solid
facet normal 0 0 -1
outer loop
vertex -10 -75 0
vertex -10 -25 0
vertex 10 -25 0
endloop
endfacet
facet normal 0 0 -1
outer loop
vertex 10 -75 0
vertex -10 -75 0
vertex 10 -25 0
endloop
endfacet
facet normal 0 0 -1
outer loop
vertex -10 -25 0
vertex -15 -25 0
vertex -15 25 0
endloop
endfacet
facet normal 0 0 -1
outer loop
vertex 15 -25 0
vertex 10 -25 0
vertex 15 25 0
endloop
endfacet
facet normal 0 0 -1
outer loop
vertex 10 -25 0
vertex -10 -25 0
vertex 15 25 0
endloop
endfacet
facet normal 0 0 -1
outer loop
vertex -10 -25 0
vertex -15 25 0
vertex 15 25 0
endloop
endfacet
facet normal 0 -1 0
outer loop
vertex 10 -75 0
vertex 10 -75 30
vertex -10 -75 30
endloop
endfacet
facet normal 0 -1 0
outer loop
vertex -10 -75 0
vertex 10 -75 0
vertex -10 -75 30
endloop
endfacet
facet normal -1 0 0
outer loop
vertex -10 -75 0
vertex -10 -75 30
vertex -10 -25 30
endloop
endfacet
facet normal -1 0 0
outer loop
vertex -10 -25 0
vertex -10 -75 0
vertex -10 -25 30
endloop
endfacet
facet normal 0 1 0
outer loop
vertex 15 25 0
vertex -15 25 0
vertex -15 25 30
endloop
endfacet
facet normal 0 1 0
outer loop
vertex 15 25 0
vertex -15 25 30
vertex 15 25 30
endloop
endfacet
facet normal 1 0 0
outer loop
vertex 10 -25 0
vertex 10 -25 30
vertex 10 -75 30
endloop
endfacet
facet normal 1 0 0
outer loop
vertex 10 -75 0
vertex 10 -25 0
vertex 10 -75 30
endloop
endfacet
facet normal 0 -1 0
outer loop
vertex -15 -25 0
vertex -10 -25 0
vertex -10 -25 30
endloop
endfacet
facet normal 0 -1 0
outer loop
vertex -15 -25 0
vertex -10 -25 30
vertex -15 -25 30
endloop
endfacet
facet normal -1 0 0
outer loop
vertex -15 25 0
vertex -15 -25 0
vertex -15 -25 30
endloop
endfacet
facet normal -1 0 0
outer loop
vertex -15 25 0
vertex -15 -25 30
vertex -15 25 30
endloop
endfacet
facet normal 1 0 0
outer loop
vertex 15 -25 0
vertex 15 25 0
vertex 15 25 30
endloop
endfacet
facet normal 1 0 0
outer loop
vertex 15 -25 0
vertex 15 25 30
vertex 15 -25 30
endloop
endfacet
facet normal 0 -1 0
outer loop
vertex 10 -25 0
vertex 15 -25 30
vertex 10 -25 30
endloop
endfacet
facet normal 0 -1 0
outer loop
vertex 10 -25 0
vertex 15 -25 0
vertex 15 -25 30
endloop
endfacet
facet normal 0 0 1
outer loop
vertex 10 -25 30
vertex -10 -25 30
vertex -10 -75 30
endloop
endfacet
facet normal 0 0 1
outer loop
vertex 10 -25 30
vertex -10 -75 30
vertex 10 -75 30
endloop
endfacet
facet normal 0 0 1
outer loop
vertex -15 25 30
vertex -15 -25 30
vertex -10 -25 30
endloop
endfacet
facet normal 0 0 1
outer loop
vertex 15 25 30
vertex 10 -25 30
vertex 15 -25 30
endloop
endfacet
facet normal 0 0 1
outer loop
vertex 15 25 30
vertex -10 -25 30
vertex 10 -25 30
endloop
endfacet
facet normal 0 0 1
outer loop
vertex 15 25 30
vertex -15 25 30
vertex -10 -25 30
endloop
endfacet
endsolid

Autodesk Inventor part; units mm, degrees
sketch "Sketch1" plane through (0, 0, 0) normal (0, 0, 1) x (1, 0, 0)
  line L0 (-15, 25) -> (15, 25)
  line L1 (15, 25) -> (15, -25)
  line L2 (15, -25) -> (-15, -25)
  line L3 (-15, -25) -> (-15, 25)
  point P0 (0, 0)
  point P1 (0, 25)
  point P2 (-15, 0)
  dimension "d0" = 50
  dimension "d1" = 30
extrude "Extrusion1" add sketch "Sketch1" along normal blind 30
sketch "Sketch2" plane through (0, 0, 30) normal (0, 0, 1) x (1, 0, 0)
  line L0 (-15, -25) -> (15, -25) projected
  line L1 (-10, -25) -> (10, -25)
  line L2 (10, -25) -> (10, -75)
  line L3 (10, -75) -> (-10, -75)
  line L4 (-10, -75) -> (-10, -25)
  point P0 (0, 0)
  point P1 (0, -25)
  point P2 (0, -25)
  dimension "d4" = 20
  dimension "d5" = 50
extrude "Extrusion2" add sketch "Sketch2" against normal blind 30
properties part number "Actuator"
